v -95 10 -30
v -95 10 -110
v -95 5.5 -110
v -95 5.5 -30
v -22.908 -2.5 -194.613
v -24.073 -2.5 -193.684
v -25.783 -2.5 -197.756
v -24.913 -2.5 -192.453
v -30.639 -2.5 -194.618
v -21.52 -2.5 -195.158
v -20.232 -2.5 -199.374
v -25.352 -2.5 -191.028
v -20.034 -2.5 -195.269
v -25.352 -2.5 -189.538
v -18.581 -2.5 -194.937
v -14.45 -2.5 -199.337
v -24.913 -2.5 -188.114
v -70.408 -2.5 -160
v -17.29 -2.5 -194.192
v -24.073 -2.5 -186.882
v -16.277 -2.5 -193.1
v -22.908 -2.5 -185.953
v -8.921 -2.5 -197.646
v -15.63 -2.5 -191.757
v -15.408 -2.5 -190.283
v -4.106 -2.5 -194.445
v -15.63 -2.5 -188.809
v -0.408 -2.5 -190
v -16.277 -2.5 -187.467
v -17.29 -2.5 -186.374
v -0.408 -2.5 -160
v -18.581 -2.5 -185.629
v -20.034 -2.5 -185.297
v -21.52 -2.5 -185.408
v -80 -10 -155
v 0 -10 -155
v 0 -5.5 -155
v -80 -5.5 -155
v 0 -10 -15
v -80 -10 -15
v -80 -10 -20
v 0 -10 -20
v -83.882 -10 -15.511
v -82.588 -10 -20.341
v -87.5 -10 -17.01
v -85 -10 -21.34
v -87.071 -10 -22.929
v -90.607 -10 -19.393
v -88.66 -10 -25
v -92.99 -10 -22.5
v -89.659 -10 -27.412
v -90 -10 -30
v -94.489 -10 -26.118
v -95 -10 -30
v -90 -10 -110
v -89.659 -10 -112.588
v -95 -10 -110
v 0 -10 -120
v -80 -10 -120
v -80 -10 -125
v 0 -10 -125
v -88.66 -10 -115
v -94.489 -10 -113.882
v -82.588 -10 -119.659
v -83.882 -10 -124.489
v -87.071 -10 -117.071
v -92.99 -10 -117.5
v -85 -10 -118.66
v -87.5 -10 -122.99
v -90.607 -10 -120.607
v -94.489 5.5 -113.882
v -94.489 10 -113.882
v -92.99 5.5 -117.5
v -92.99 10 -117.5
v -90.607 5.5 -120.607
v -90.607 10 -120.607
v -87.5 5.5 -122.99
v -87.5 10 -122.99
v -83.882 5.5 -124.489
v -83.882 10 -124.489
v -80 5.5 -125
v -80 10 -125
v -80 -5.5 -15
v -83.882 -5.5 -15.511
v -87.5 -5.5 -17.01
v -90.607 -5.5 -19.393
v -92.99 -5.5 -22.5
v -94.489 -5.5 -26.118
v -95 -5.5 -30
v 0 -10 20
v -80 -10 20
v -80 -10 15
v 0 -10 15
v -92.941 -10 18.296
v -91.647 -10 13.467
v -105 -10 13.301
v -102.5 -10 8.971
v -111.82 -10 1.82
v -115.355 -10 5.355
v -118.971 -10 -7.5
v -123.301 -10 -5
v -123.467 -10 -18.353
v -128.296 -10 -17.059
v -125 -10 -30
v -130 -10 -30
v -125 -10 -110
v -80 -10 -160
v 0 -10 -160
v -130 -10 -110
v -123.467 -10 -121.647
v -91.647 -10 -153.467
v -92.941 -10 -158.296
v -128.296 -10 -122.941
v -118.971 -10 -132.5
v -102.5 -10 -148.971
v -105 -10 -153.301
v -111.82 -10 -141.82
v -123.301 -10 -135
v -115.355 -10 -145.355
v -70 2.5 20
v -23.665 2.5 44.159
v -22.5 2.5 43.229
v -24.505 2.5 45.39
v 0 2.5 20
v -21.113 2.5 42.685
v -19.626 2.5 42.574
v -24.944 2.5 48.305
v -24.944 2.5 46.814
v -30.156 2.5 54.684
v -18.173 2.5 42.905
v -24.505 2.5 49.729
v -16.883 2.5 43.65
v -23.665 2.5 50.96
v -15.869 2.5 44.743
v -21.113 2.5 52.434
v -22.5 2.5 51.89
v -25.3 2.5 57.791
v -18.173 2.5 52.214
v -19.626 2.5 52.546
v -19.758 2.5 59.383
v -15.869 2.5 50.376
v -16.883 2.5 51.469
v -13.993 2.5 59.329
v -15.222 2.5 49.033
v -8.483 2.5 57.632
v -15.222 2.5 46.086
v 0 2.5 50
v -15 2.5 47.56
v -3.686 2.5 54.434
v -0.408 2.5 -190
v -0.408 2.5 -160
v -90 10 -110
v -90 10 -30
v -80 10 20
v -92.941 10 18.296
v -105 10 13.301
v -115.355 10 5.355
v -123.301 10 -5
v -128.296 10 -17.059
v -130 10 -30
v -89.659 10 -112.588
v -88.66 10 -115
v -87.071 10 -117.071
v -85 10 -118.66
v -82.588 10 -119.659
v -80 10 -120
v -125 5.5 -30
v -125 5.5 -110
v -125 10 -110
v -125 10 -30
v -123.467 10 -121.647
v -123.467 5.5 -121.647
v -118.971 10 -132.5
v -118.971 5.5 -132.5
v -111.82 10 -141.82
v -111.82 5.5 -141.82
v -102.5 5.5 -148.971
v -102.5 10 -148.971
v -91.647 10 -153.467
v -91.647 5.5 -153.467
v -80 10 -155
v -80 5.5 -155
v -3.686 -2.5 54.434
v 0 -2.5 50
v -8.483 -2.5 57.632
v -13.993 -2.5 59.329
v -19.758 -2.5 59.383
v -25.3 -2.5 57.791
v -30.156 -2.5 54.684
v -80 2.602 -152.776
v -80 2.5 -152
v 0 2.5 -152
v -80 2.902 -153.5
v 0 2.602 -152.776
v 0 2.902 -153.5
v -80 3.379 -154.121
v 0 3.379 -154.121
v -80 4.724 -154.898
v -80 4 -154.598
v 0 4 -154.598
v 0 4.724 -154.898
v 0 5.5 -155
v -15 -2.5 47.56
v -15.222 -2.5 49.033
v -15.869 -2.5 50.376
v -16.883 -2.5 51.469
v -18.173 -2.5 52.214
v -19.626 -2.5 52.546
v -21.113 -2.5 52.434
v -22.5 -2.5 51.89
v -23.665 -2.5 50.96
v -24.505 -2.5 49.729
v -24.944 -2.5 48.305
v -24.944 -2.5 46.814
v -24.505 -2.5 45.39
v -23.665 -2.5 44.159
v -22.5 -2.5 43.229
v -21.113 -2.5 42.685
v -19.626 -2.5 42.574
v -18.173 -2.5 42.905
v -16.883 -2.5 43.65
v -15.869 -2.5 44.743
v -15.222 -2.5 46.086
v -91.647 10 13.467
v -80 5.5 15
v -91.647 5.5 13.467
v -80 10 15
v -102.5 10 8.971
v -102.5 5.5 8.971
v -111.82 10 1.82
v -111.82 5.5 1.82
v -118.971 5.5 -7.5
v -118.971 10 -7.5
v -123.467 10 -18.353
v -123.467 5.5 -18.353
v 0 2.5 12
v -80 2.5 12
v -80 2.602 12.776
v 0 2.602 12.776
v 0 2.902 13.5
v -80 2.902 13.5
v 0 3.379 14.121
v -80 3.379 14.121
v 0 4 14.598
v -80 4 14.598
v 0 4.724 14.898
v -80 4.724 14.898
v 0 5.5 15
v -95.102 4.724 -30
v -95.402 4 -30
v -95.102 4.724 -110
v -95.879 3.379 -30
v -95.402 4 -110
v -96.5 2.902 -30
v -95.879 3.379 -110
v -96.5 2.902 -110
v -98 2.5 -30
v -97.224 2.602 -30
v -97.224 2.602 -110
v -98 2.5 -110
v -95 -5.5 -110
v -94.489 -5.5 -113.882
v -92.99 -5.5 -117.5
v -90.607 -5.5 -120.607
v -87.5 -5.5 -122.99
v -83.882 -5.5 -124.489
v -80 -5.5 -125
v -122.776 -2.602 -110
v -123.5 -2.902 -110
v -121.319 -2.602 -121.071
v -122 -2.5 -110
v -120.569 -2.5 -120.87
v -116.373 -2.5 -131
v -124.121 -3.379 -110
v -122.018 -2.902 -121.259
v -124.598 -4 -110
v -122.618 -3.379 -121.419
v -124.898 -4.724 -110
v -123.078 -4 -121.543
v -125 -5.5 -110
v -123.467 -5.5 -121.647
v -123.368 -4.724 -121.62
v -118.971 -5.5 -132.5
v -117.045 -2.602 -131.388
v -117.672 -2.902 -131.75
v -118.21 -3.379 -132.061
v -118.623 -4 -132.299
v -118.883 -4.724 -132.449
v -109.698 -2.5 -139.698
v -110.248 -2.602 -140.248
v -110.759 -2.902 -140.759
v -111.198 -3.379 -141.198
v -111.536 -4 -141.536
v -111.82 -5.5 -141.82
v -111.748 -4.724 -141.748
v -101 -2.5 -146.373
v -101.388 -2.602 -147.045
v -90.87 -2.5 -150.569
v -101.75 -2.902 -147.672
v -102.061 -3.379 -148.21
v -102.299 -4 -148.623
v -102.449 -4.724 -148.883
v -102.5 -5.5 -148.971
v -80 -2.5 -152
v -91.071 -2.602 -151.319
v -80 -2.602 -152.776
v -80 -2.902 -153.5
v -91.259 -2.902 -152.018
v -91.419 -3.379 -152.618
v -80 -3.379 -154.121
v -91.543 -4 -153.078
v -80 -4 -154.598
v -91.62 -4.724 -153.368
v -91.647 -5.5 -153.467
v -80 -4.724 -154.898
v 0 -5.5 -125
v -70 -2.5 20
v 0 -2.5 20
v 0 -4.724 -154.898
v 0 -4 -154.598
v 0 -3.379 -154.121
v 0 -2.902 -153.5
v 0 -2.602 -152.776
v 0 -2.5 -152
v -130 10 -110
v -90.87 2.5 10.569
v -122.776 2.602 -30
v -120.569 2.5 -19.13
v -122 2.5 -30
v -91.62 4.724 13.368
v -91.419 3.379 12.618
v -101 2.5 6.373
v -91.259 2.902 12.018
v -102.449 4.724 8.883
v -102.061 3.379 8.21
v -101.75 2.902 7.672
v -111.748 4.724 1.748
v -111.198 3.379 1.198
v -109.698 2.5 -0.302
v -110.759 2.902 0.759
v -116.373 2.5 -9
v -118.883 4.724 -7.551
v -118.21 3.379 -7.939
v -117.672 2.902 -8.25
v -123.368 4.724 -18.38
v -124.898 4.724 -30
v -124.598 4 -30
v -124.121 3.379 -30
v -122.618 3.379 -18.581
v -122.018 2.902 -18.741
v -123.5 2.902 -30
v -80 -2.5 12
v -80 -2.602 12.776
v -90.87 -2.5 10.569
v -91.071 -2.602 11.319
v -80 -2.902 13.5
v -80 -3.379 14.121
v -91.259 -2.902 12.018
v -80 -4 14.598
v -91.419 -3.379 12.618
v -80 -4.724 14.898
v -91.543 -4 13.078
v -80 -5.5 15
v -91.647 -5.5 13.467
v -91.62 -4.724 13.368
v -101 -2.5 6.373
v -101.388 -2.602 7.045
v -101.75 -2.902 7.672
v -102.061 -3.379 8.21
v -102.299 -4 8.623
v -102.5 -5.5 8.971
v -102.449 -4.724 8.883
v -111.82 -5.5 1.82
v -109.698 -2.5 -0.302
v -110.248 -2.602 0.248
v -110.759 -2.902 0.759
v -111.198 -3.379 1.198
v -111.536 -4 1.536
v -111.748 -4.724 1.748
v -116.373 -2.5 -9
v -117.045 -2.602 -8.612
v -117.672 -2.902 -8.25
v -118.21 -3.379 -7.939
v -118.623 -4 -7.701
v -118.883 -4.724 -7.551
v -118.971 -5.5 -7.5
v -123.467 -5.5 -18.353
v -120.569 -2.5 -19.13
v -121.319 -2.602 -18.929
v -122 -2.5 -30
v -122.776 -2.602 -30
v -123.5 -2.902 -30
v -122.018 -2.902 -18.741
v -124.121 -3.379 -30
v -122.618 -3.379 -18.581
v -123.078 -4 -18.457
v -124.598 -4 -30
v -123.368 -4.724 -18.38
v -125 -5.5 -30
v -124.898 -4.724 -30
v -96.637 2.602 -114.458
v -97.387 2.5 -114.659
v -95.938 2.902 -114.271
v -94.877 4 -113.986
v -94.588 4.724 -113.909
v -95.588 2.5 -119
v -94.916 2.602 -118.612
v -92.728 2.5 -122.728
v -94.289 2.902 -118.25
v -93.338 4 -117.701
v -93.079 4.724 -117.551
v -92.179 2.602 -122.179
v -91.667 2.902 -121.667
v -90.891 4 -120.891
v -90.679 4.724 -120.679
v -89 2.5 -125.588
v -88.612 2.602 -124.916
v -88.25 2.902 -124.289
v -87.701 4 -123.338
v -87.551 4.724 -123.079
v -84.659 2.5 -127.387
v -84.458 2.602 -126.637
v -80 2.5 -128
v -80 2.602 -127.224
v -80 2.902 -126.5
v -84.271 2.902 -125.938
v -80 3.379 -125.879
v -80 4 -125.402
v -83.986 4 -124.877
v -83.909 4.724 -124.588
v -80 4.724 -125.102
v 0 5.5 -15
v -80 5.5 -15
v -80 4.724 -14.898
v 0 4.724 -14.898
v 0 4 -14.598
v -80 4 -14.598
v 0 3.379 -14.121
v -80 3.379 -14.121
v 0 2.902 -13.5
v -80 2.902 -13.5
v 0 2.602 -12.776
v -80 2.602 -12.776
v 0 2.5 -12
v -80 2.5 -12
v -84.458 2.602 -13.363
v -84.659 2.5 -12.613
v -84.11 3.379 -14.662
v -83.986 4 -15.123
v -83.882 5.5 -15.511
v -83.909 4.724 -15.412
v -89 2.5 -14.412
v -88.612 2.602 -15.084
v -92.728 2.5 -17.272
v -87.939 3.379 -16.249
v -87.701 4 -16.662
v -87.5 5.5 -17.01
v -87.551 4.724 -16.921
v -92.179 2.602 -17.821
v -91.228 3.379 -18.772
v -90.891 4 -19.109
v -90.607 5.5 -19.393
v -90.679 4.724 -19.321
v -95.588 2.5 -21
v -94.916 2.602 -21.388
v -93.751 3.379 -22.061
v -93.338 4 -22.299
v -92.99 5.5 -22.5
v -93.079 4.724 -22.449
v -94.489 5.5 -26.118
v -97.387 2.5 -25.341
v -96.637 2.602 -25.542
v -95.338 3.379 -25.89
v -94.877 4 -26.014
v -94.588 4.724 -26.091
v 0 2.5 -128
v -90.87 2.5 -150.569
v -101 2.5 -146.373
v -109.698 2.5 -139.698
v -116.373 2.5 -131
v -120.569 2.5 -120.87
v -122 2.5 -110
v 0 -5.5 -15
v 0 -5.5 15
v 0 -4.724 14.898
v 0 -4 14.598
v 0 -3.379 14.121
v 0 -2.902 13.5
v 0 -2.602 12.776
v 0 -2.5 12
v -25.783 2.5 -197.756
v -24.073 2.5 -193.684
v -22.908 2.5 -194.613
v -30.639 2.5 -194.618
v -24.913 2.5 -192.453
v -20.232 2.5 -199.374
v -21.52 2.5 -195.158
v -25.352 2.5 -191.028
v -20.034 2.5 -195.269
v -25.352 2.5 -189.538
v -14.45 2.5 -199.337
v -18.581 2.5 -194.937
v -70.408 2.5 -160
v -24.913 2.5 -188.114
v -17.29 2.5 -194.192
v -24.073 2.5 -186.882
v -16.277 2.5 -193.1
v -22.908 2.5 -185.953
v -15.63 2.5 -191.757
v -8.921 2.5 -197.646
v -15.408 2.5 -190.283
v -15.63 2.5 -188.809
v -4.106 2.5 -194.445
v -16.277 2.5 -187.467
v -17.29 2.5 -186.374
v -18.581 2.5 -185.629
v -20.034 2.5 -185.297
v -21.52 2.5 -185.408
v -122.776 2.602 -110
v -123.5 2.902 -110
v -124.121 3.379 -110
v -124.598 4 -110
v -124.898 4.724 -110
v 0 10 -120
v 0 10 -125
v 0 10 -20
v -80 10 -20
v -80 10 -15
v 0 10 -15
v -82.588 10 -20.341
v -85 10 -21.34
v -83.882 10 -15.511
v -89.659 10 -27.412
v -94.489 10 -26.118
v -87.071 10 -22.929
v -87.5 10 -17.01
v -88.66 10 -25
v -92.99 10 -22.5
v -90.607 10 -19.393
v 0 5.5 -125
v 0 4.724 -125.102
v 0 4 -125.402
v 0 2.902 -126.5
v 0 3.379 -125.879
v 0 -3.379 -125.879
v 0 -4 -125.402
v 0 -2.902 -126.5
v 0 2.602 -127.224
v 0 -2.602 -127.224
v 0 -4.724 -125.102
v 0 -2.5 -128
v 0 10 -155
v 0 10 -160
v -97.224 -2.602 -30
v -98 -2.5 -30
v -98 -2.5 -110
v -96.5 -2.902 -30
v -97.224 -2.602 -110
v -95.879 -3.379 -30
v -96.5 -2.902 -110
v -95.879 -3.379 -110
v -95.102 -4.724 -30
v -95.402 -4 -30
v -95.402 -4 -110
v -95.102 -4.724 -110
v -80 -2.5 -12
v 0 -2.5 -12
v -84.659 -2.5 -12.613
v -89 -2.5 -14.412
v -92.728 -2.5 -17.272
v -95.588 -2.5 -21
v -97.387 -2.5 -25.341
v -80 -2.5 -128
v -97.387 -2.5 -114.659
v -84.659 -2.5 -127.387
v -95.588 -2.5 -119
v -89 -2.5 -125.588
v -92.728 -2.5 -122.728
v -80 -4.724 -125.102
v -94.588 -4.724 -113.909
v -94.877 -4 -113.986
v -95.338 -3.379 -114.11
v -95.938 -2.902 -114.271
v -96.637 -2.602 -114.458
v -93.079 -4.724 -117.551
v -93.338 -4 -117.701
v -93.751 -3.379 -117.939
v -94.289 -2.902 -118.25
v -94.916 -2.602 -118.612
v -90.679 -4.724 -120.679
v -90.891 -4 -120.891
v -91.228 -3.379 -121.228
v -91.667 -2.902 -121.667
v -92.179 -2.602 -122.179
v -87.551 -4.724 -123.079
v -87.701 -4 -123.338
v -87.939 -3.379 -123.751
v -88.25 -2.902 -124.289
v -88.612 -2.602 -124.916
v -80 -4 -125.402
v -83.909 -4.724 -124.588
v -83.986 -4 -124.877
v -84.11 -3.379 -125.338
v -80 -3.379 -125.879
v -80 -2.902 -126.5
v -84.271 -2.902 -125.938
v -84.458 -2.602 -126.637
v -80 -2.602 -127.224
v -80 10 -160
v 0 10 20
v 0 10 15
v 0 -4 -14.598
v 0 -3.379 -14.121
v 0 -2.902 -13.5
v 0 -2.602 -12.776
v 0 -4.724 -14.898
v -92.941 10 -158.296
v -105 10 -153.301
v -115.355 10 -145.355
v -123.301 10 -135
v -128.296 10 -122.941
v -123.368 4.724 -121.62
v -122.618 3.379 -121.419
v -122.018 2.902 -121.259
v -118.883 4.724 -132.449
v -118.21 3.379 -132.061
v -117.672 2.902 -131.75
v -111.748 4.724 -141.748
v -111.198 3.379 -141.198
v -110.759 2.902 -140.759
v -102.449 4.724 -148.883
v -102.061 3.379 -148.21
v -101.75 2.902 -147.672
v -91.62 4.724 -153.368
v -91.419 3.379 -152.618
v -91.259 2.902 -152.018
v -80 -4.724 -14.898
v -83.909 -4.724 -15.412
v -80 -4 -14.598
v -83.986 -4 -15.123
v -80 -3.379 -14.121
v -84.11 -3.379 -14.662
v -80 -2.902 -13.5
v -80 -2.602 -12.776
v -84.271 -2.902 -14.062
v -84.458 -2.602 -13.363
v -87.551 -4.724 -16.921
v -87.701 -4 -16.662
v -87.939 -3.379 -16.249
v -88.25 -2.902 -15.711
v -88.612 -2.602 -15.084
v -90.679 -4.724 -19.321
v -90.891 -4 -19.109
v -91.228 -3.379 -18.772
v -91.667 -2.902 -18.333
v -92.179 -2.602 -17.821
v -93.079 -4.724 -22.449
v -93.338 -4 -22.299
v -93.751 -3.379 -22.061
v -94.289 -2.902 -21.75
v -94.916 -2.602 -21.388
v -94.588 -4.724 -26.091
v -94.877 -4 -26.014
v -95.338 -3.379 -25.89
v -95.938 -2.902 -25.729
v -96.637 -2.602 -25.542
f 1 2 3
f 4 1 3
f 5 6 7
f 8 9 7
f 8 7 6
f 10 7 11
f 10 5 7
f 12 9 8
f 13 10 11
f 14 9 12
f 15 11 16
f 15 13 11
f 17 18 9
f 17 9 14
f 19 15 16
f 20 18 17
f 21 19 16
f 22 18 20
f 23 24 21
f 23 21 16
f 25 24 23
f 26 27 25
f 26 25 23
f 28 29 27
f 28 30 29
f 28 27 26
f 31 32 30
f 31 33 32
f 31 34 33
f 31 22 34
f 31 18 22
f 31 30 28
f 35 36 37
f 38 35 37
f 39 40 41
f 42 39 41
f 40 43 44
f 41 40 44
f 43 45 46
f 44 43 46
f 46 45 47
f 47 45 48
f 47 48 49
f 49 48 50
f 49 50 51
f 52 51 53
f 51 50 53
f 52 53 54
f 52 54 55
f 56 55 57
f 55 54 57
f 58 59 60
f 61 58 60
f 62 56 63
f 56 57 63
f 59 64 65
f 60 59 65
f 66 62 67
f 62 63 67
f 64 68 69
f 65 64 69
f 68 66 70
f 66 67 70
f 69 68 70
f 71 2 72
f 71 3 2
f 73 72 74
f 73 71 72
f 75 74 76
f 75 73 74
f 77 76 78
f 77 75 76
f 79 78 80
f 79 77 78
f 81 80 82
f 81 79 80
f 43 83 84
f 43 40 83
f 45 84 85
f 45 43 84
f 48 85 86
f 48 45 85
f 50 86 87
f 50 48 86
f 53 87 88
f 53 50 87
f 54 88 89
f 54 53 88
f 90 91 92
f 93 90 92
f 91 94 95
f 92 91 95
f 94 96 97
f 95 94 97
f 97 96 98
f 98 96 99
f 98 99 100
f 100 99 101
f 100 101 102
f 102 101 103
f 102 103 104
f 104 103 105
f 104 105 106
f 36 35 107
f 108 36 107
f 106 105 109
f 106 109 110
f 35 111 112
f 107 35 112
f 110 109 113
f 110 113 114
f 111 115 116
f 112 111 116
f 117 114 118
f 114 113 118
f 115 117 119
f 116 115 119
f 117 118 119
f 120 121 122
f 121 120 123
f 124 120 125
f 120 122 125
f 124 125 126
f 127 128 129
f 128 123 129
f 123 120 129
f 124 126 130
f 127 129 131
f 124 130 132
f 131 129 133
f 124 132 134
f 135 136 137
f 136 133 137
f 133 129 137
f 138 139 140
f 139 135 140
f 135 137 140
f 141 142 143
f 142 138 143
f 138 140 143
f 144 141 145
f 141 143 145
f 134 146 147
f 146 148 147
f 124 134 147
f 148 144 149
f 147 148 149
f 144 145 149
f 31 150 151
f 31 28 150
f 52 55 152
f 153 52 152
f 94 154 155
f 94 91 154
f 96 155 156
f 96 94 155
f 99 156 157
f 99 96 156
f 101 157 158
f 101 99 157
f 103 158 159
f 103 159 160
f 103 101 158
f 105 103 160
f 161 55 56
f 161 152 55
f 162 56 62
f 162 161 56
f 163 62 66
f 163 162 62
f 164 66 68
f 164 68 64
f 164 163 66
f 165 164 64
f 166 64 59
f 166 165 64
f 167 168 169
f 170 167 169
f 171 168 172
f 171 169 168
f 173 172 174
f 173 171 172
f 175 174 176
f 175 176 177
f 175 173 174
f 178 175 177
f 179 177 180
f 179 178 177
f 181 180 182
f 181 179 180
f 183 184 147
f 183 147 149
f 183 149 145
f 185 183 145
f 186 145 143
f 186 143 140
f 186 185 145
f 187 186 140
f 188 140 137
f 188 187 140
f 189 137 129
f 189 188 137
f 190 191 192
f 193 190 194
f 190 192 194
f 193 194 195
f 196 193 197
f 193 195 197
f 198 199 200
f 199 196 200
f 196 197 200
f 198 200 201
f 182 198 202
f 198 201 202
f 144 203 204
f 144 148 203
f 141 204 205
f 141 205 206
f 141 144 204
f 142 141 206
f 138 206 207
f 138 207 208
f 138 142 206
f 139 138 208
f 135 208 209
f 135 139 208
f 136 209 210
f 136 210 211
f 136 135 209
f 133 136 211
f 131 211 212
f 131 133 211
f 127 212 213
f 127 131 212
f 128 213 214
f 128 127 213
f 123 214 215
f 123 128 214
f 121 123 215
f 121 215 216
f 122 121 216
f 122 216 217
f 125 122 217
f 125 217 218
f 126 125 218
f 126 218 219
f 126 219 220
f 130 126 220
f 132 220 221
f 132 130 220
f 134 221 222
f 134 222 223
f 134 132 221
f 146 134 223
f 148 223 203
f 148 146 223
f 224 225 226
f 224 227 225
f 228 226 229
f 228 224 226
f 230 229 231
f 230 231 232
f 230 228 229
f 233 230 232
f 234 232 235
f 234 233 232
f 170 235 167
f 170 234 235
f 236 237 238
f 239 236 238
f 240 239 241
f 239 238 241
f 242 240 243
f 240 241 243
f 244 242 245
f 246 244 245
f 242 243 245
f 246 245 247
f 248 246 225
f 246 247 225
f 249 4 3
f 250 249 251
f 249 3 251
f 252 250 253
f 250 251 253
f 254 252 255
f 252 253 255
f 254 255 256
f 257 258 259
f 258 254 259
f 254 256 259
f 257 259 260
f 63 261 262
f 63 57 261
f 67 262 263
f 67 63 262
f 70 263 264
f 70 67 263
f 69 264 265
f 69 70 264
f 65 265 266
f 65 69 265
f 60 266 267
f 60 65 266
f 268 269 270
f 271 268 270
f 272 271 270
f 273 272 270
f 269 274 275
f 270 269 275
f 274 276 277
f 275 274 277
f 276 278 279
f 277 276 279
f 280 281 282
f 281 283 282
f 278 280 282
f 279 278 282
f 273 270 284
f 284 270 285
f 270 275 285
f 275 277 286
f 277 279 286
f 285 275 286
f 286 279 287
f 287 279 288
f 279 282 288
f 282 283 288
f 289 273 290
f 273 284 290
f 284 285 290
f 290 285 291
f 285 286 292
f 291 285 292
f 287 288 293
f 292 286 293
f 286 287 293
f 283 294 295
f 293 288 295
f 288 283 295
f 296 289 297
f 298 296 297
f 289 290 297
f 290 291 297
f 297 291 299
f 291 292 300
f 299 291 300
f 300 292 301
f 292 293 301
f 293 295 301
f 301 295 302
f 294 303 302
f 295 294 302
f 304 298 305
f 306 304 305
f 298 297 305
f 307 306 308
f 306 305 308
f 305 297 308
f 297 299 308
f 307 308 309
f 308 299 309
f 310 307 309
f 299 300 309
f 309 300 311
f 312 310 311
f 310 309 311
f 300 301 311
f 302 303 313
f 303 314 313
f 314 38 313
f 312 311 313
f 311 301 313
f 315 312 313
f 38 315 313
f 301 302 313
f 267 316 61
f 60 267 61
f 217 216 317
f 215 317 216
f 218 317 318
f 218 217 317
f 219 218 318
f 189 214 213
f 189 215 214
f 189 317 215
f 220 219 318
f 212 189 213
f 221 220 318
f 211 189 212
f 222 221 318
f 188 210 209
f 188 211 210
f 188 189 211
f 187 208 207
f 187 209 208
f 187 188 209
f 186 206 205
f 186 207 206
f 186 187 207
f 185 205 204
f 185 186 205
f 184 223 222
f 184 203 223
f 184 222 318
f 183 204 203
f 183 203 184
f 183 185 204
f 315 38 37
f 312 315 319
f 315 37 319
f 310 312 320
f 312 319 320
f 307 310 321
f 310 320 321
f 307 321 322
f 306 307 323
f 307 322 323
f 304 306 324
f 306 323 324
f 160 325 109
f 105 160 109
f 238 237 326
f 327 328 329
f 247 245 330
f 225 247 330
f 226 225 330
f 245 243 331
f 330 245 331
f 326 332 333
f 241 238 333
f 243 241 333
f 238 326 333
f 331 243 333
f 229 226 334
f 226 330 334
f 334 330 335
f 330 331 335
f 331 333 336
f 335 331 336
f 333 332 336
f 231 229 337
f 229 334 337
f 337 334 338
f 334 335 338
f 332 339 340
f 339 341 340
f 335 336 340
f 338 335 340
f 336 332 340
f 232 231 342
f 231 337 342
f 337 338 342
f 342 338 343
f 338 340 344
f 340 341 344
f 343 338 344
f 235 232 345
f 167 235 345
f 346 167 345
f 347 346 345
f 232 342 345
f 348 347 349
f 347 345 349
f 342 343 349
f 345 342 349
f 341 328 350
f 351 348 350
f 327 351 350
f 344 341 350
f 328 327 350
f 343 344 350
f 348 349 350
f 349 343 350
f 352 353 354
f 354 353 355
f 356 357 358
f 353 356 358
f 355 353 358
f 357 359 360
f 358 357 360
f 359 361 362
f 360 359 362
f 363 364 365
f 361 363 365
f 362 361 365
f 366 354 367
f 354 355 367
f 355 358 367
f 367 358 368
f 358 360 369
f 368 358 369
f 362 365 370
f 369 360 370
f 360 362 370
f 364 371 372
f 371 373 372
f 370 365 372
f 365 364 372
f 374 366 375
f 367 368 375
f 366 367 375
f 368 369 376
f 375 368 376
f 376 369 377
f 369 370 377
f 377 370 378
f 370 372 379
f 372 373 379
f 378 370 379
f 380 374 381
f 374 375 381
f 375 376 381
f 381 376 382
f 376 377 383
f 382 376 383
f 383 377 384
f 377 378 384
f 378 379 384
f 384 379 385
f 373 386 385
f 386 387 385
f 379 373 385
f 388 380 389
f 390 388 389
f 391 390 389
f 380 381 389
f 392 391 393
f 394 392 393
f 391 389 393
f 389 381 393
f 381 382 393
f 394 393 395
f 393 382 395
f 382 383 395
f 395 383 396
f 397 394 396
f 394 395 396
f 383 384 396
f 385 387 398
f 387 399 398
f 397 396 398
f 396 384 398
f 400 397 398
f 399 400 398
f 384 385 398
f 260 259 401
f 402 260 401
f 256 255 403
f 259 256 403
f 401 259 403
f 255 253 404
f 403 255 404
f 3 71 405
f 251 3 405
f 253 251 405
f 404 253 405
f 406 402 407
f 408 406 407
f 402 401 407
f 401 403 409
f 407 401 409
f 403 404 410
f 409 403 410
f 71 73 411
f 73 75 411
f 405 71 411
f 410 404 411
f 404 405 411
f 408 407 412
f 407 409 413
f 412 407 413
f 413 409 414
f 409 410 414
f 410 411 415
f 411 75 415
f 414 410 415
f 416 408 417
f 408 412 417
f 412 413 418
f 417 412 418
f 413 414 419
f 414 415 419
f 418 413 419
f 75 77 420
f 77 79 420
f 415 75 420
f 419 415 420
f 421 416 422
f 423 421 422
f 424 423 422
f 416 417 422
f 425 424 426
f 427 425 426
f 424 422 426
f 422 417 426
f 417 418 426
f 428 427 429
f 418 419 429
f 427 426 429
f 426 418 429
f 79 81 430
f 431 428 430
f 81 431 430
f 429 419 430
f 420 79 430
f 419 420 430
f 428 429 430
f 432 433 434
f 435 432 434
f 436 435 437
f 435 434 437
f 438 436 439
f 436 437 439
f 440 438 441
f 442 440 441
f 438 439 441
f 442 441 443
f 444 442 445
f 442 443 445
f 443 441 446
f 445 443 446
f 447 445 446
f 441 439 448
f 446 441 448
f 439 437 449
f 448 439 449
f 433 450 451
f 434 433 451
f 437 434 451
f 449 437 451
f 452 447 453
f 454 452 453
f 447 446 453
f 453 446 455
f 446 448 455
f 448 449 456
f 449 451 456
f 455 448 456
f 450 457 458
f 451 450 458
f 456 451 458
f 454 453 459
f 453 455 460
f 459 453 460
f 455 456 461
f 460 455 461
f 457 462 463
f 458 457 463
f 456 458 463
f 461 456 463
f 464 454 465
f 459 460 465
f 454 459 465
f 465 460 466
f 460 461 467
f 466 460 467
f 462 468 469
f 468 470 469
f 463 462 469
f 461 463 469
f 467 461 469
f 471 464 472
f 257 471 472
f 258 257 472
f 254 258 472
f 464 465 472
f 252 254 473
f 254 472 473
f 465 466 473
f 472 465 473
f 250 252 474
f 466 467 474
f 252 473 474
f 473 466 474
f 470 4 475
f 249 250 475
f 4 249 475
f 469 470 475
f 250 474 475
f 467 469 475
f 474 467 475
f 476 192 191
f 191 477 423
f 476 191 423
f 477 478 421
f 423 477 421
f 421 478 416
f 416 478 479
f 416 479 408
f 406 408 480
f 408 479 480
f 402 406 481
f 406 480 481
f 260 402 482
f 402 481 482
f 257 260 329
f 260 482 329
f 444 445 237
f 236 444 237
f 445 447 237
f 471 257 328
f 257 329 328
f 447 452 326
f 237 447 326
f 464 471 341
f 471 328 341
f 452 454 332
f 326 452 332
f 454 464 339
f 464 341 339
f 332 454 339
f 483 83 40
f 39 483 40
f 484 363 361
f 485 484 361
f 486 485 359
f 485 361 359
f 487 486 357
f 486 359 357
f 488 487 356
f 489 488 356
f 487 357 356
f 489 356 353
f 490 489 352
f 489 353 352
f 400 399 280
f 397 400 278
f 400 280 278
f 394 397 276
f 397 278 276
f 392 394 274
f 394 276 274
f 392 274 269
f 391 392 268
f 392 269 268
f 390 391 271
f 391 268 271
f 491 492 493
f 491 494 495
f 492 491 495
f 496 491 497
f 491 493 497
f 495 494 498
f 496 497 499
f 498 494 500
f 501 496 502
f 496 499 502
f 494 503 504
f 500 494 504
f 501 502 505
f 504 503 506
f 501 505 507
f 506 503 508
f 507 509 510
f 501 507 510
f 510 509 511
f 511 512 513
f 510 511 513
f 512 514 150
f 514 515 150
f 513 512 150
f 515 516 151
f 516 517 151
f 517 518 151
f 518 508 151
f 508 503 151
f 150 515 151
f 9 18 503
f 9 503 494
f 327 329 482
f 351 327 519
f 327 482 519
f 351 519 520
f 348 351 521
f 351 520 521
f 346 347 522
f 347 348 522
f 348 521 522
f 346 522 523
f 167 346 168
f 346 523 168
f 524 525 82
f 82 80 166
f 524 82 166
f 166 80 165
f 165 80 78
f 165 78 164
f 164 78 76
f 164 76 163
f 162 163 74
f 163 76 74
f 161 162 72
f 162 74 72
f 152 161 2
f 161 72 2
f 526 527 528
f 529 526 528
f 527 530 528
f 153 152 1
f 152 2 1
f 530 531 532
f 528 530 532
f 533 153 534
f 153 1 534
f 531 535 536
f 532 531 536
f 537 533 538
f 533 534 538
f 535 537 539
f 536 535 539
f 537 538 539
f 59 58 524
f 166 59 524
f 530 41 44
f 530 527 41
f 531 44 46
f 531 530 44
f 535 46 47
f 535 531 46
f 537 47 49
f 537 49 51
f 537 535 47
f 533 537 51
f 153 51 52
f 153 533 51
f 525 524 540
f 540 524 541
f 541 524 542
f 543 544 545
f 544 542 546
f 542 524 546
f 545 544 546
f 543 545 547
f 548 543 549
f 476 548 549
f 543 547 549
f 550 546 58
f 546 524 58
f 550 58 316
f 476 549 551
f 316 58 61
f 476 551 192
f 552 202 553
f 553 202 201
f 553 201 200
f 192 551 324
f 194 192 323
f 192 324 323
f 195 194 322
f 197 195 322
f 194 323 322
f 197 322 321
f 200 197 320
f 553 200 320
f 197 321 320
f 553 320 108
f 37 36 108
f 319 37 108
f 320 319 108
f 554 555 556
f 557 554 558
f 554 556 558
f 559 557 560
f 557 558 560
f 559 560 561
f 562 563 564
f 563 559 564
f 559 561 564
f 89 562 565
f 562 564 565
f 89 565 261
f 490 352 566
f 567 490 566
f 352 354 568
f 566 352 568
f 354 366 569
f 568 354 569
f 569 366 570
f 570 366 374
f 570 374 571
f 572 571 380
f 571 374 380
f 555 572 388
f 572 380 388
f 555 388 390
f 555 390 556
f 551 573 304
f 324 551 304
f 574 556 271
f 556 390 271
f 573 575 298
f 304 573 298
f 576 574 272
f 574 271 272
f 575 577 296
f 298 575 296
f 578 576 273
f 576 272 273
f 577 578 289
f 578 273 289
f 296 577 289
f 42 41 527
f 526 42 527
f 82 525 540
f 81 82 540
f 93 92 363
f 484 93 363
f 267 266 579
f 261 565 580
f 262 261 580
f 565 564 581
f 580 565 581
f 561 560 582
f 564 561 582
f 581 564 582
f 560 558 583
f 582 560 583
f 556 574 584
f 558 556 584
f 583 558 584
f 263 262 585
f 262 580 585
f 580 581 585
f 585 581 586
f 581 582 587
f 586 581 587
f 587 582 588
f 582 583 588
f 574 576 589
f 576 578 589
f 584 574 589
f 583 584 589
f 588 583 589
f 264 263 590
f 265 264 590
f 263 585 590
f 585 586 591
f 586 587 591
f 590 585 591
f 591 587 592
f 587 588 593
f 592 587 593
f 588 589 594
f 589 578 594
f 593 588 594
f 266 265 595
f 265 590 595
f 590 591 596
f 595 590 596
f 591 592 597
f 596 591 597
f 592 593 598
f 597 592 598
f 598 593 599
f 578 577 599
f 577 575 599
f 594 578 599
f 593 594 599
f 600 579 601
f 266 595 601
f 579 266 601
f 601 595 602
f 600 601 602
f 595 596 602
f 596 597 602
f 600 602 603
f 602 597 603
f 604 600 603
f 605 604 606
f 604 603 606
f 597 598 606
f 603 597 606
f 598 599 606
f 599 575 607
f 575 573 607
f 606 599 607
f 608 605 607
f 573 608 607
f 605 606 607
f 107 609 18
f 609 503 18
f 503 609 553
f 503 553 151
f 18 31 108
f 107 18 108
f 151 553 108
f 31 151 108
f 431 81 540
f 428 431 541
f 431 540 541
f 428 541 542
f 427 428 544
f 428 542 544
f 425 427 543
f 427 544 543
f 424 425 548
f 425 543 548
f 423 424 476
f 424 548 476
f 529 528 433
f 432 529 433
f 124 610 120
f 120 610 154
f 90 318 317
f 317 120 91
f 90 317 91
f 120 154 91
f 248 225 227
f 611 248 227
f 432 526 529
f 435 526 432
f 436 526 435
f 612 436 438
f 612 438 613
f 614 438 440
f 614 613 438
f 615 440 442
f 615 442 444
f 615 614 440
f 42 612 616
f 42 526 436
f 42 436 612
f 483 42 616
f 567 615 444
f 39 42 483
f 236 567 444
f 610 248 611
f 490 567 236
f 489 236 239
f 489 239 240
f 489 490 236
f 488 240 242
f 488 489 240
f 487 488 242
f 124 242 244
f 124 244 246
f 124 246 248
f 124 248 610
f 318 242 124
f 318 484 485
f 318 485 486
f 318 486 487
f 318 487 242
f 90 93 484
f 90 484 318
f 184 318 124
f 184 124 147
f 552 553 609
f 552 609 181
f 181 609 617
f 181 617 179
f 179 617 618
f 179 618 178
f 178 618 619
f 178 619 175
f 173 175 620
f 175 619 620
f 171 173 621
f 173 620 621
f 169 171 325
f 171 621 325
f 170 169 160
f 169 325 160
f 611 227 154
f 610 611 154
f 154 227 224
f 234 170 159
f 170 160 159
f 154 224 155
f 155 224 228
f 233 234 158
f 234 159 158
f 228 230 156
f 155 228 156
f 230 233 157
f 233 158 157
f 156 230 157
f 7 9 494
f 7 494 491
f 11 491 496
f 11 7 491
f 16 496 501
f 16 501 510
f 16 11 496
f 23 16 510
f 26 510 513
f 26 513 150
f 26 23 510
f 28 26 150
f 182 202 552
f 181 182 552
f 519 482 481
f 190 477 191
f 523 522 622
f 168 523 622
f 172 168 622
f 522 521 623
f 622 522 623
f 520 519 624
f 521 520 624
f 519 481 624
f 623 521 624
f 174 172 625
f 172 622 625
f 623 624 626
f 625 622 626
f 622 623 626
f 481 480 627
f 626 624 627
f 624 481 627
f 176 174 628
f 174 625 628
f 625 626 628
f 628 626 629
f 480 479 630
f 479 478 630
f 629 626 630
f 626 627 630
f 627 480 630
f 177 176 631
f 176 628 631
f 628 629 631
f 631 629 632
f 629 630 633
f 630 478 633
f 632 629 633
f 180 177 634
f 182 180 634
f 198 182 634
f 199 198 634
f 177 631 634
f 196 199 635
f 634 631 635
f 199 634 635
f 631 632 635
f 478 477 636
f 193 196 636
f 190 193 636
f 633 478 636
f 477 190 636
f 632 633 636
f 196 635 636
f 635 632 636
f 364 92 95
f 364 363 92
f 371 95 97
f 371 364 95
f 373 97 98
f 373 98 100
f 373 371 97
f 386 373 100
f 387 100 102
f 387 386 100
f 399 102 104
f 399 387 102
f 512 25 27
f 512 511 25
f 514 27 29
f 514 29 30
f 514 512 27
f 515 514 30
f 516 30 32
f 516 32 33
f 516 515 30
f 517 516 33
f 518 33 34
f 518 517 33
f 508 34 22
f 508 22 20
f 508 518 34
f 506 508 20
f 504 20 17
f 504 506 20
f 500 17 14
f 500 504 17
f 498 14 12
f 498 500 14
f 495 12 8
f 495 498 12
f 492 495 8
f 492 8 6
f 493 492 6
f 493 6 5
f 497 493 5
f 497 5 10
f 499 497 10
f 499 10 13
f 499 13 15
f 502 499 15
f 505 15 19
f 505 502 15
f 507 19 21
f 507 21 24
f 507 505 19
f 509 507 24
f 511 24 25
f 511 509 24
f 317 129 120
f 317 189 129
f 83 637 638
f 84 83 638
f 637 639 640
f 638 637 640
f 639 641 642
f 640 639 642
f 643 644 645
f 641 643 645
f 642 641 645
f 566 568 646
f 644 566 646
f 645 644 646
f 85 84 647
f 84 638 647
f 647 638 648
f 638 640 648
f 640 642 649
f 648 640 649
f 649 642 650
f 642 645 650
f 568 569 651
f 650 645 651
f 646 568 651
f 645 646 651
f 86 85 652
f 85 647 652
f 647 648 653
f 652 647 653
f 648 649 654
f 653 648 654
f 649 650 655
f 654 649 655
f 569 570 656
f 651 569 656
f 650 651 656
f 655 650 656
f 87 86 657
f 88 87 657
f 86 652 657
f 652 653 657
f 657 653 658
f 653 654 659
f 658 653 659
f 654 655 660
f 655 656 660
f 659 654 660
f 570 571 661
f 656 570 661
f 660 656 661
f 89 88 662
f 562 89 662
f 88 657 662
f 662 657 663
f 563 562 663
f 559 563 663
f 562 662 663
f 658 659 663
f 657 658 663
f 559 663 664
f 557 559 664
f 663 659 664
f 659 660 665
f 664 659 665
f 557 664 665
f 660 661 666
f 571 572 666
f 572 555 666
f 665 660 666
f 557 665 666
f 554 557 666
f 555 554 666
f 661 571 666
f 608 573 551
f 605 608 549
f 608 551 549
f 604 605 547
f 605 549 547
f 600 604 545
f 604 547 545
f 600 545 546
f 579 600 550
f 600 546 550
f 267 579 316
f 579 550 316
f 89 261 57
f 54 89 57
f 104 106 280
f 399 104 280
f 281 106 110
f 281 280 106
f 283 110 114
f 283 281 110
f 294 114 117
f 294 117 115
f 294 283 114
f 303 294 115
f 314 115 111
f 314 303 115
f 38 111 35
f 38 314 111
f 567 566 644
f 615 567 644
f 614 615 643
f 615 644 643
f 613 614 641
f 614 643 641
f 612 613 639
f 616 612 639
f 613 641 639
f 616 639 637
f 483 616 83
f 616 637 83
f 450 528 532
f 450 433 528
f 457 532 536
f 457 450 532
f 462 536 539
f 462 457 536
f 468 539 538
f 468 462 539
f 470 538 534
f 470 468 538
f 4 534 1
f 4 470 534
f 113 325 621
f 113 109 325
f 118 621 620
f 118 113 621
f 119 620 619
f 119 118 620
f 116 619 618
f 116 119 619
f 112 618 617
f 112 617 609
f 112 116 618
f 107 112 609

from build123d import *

# Parameters (mm, degrees)
F3_R     = 5
F4_DEPTH = 2.5
F5_DEPTH = 2.5


with BuildPart() as f2:
    # F2: sweep along a path in F1
    with BuildLine(Plane.XZ) as f2_path:
        Line((0, 0), (-80, 0))
        ThreePointArc((-80, 0), (-101.2132034356, -8.7867965644), (-110, -30))
        Line((-110, -30), (-110, -110))
        ThreePointArc((-110, -110), (-101.2132034356, -131.2132034356), (-80, -140))
        Line((-80, -140), (0, -140))
    # F0 (on Right) → F2 (sweep)
    with BuildSketch(Plane.YZ):
        with BuildLine():
            Line((10, 20), (0, 20))
            Line((0, 20), (-10, 20))
            Line((-10, 20), (-10, 15))
            Line((-10, 15), (-5.5, 15))
            ThreePointArc((-5.5, 15), (-3.3786796564, 14.1213203436), (-2.5, 12))
            Line((-2.5, 12), (-2.5, 0))
            Line((-2.5, 0), (-2.5, -12))
            ThreePointArc((-2.5, -12), (-3.3786796564, -14.1213203436), (-5.5, -15))
            Line((-5.5, -15), (-10, -15))
            Line((-10, -15), (-10, -20))
            Line((-10, -20), (0, -20))
            Line((0, -20), (10, -20))
            Line((10, -20), (10, -15))
            Line((10, -15), (5.5, -15))
            ThreePointArc((5.5, -15), (3.3786796564, -14.1213203436), (2.5, -12))
            Line((2.5, -12), (2.5, 0))
            Line((2.5, 0), (2.5, 12))
            ThreePointArc((2.5, 12), (3.3786796564, 14.1213203436), (5.5, 15))
            Line((5.5, 15), (10, 15))
            Line((10, 15), (10, 20))
        make_face()
    sweep(path=f2_path.line)

    # F3 (on Front) → F4 (join, symmetric)
    with BuildSketch(Plane.XZ):
        with BuildLine():
            Line((-70, 20), (0, 20))
            Line((0, 20), (0, 50))
            ThreePointArc((0, 50), (-13.9930064723, 59.3289627376), (-30.1564242691, 54.6837823298))
            Line((-30.1564242691, 54.6837823298), (-70, 20))
        make_face()
        with Locations((-20, 47.5595779717)):
            Circle(F3_R, mode=Mode.SUBTRACT)
    extrude(amount=F4_DEPTH, both=True)

    # F3 (on Front) → F5 (join, symmetric)
    with BuildSketch(Plane.XZ):
        with BuildLine():
            Line((-70, 20), (0, 20))
            Line((0, 20), (0, 50))
            ThreePointArc((0, 50), (-13.9930064723, 59.3289627376), (-30.1564242691, 54.6837823298))
            Line((-30.1564242691, 54.6837823298), (-70, 20))
        make_face()
        with Locations((-20, 47.5595779717)):
            Circle(F3_R, mode=Mode.SUBTRACT)
        with BuildLine():
            Line((-0.4077370701, -160), (-70.4077370701, -160))
            Line((-70.4077370701, -160), (-30.6394707567, -194.618225577))
            ThreePointArc((-30.6394707567, -194.618225577), (-14.4500845673, -199.3365631453), (-0.4077370701, -190))
            Line((-0.4077370701, -190), (-0.4077370701, -160))
        make_face()
        with Locations((-20.4077370701, -190.2831075506)):
            Circle(F3_R, mode=Mode.SUBTRACT)
    extrude(amount=F5_DEPTH, both=True)


solid = f2.part
